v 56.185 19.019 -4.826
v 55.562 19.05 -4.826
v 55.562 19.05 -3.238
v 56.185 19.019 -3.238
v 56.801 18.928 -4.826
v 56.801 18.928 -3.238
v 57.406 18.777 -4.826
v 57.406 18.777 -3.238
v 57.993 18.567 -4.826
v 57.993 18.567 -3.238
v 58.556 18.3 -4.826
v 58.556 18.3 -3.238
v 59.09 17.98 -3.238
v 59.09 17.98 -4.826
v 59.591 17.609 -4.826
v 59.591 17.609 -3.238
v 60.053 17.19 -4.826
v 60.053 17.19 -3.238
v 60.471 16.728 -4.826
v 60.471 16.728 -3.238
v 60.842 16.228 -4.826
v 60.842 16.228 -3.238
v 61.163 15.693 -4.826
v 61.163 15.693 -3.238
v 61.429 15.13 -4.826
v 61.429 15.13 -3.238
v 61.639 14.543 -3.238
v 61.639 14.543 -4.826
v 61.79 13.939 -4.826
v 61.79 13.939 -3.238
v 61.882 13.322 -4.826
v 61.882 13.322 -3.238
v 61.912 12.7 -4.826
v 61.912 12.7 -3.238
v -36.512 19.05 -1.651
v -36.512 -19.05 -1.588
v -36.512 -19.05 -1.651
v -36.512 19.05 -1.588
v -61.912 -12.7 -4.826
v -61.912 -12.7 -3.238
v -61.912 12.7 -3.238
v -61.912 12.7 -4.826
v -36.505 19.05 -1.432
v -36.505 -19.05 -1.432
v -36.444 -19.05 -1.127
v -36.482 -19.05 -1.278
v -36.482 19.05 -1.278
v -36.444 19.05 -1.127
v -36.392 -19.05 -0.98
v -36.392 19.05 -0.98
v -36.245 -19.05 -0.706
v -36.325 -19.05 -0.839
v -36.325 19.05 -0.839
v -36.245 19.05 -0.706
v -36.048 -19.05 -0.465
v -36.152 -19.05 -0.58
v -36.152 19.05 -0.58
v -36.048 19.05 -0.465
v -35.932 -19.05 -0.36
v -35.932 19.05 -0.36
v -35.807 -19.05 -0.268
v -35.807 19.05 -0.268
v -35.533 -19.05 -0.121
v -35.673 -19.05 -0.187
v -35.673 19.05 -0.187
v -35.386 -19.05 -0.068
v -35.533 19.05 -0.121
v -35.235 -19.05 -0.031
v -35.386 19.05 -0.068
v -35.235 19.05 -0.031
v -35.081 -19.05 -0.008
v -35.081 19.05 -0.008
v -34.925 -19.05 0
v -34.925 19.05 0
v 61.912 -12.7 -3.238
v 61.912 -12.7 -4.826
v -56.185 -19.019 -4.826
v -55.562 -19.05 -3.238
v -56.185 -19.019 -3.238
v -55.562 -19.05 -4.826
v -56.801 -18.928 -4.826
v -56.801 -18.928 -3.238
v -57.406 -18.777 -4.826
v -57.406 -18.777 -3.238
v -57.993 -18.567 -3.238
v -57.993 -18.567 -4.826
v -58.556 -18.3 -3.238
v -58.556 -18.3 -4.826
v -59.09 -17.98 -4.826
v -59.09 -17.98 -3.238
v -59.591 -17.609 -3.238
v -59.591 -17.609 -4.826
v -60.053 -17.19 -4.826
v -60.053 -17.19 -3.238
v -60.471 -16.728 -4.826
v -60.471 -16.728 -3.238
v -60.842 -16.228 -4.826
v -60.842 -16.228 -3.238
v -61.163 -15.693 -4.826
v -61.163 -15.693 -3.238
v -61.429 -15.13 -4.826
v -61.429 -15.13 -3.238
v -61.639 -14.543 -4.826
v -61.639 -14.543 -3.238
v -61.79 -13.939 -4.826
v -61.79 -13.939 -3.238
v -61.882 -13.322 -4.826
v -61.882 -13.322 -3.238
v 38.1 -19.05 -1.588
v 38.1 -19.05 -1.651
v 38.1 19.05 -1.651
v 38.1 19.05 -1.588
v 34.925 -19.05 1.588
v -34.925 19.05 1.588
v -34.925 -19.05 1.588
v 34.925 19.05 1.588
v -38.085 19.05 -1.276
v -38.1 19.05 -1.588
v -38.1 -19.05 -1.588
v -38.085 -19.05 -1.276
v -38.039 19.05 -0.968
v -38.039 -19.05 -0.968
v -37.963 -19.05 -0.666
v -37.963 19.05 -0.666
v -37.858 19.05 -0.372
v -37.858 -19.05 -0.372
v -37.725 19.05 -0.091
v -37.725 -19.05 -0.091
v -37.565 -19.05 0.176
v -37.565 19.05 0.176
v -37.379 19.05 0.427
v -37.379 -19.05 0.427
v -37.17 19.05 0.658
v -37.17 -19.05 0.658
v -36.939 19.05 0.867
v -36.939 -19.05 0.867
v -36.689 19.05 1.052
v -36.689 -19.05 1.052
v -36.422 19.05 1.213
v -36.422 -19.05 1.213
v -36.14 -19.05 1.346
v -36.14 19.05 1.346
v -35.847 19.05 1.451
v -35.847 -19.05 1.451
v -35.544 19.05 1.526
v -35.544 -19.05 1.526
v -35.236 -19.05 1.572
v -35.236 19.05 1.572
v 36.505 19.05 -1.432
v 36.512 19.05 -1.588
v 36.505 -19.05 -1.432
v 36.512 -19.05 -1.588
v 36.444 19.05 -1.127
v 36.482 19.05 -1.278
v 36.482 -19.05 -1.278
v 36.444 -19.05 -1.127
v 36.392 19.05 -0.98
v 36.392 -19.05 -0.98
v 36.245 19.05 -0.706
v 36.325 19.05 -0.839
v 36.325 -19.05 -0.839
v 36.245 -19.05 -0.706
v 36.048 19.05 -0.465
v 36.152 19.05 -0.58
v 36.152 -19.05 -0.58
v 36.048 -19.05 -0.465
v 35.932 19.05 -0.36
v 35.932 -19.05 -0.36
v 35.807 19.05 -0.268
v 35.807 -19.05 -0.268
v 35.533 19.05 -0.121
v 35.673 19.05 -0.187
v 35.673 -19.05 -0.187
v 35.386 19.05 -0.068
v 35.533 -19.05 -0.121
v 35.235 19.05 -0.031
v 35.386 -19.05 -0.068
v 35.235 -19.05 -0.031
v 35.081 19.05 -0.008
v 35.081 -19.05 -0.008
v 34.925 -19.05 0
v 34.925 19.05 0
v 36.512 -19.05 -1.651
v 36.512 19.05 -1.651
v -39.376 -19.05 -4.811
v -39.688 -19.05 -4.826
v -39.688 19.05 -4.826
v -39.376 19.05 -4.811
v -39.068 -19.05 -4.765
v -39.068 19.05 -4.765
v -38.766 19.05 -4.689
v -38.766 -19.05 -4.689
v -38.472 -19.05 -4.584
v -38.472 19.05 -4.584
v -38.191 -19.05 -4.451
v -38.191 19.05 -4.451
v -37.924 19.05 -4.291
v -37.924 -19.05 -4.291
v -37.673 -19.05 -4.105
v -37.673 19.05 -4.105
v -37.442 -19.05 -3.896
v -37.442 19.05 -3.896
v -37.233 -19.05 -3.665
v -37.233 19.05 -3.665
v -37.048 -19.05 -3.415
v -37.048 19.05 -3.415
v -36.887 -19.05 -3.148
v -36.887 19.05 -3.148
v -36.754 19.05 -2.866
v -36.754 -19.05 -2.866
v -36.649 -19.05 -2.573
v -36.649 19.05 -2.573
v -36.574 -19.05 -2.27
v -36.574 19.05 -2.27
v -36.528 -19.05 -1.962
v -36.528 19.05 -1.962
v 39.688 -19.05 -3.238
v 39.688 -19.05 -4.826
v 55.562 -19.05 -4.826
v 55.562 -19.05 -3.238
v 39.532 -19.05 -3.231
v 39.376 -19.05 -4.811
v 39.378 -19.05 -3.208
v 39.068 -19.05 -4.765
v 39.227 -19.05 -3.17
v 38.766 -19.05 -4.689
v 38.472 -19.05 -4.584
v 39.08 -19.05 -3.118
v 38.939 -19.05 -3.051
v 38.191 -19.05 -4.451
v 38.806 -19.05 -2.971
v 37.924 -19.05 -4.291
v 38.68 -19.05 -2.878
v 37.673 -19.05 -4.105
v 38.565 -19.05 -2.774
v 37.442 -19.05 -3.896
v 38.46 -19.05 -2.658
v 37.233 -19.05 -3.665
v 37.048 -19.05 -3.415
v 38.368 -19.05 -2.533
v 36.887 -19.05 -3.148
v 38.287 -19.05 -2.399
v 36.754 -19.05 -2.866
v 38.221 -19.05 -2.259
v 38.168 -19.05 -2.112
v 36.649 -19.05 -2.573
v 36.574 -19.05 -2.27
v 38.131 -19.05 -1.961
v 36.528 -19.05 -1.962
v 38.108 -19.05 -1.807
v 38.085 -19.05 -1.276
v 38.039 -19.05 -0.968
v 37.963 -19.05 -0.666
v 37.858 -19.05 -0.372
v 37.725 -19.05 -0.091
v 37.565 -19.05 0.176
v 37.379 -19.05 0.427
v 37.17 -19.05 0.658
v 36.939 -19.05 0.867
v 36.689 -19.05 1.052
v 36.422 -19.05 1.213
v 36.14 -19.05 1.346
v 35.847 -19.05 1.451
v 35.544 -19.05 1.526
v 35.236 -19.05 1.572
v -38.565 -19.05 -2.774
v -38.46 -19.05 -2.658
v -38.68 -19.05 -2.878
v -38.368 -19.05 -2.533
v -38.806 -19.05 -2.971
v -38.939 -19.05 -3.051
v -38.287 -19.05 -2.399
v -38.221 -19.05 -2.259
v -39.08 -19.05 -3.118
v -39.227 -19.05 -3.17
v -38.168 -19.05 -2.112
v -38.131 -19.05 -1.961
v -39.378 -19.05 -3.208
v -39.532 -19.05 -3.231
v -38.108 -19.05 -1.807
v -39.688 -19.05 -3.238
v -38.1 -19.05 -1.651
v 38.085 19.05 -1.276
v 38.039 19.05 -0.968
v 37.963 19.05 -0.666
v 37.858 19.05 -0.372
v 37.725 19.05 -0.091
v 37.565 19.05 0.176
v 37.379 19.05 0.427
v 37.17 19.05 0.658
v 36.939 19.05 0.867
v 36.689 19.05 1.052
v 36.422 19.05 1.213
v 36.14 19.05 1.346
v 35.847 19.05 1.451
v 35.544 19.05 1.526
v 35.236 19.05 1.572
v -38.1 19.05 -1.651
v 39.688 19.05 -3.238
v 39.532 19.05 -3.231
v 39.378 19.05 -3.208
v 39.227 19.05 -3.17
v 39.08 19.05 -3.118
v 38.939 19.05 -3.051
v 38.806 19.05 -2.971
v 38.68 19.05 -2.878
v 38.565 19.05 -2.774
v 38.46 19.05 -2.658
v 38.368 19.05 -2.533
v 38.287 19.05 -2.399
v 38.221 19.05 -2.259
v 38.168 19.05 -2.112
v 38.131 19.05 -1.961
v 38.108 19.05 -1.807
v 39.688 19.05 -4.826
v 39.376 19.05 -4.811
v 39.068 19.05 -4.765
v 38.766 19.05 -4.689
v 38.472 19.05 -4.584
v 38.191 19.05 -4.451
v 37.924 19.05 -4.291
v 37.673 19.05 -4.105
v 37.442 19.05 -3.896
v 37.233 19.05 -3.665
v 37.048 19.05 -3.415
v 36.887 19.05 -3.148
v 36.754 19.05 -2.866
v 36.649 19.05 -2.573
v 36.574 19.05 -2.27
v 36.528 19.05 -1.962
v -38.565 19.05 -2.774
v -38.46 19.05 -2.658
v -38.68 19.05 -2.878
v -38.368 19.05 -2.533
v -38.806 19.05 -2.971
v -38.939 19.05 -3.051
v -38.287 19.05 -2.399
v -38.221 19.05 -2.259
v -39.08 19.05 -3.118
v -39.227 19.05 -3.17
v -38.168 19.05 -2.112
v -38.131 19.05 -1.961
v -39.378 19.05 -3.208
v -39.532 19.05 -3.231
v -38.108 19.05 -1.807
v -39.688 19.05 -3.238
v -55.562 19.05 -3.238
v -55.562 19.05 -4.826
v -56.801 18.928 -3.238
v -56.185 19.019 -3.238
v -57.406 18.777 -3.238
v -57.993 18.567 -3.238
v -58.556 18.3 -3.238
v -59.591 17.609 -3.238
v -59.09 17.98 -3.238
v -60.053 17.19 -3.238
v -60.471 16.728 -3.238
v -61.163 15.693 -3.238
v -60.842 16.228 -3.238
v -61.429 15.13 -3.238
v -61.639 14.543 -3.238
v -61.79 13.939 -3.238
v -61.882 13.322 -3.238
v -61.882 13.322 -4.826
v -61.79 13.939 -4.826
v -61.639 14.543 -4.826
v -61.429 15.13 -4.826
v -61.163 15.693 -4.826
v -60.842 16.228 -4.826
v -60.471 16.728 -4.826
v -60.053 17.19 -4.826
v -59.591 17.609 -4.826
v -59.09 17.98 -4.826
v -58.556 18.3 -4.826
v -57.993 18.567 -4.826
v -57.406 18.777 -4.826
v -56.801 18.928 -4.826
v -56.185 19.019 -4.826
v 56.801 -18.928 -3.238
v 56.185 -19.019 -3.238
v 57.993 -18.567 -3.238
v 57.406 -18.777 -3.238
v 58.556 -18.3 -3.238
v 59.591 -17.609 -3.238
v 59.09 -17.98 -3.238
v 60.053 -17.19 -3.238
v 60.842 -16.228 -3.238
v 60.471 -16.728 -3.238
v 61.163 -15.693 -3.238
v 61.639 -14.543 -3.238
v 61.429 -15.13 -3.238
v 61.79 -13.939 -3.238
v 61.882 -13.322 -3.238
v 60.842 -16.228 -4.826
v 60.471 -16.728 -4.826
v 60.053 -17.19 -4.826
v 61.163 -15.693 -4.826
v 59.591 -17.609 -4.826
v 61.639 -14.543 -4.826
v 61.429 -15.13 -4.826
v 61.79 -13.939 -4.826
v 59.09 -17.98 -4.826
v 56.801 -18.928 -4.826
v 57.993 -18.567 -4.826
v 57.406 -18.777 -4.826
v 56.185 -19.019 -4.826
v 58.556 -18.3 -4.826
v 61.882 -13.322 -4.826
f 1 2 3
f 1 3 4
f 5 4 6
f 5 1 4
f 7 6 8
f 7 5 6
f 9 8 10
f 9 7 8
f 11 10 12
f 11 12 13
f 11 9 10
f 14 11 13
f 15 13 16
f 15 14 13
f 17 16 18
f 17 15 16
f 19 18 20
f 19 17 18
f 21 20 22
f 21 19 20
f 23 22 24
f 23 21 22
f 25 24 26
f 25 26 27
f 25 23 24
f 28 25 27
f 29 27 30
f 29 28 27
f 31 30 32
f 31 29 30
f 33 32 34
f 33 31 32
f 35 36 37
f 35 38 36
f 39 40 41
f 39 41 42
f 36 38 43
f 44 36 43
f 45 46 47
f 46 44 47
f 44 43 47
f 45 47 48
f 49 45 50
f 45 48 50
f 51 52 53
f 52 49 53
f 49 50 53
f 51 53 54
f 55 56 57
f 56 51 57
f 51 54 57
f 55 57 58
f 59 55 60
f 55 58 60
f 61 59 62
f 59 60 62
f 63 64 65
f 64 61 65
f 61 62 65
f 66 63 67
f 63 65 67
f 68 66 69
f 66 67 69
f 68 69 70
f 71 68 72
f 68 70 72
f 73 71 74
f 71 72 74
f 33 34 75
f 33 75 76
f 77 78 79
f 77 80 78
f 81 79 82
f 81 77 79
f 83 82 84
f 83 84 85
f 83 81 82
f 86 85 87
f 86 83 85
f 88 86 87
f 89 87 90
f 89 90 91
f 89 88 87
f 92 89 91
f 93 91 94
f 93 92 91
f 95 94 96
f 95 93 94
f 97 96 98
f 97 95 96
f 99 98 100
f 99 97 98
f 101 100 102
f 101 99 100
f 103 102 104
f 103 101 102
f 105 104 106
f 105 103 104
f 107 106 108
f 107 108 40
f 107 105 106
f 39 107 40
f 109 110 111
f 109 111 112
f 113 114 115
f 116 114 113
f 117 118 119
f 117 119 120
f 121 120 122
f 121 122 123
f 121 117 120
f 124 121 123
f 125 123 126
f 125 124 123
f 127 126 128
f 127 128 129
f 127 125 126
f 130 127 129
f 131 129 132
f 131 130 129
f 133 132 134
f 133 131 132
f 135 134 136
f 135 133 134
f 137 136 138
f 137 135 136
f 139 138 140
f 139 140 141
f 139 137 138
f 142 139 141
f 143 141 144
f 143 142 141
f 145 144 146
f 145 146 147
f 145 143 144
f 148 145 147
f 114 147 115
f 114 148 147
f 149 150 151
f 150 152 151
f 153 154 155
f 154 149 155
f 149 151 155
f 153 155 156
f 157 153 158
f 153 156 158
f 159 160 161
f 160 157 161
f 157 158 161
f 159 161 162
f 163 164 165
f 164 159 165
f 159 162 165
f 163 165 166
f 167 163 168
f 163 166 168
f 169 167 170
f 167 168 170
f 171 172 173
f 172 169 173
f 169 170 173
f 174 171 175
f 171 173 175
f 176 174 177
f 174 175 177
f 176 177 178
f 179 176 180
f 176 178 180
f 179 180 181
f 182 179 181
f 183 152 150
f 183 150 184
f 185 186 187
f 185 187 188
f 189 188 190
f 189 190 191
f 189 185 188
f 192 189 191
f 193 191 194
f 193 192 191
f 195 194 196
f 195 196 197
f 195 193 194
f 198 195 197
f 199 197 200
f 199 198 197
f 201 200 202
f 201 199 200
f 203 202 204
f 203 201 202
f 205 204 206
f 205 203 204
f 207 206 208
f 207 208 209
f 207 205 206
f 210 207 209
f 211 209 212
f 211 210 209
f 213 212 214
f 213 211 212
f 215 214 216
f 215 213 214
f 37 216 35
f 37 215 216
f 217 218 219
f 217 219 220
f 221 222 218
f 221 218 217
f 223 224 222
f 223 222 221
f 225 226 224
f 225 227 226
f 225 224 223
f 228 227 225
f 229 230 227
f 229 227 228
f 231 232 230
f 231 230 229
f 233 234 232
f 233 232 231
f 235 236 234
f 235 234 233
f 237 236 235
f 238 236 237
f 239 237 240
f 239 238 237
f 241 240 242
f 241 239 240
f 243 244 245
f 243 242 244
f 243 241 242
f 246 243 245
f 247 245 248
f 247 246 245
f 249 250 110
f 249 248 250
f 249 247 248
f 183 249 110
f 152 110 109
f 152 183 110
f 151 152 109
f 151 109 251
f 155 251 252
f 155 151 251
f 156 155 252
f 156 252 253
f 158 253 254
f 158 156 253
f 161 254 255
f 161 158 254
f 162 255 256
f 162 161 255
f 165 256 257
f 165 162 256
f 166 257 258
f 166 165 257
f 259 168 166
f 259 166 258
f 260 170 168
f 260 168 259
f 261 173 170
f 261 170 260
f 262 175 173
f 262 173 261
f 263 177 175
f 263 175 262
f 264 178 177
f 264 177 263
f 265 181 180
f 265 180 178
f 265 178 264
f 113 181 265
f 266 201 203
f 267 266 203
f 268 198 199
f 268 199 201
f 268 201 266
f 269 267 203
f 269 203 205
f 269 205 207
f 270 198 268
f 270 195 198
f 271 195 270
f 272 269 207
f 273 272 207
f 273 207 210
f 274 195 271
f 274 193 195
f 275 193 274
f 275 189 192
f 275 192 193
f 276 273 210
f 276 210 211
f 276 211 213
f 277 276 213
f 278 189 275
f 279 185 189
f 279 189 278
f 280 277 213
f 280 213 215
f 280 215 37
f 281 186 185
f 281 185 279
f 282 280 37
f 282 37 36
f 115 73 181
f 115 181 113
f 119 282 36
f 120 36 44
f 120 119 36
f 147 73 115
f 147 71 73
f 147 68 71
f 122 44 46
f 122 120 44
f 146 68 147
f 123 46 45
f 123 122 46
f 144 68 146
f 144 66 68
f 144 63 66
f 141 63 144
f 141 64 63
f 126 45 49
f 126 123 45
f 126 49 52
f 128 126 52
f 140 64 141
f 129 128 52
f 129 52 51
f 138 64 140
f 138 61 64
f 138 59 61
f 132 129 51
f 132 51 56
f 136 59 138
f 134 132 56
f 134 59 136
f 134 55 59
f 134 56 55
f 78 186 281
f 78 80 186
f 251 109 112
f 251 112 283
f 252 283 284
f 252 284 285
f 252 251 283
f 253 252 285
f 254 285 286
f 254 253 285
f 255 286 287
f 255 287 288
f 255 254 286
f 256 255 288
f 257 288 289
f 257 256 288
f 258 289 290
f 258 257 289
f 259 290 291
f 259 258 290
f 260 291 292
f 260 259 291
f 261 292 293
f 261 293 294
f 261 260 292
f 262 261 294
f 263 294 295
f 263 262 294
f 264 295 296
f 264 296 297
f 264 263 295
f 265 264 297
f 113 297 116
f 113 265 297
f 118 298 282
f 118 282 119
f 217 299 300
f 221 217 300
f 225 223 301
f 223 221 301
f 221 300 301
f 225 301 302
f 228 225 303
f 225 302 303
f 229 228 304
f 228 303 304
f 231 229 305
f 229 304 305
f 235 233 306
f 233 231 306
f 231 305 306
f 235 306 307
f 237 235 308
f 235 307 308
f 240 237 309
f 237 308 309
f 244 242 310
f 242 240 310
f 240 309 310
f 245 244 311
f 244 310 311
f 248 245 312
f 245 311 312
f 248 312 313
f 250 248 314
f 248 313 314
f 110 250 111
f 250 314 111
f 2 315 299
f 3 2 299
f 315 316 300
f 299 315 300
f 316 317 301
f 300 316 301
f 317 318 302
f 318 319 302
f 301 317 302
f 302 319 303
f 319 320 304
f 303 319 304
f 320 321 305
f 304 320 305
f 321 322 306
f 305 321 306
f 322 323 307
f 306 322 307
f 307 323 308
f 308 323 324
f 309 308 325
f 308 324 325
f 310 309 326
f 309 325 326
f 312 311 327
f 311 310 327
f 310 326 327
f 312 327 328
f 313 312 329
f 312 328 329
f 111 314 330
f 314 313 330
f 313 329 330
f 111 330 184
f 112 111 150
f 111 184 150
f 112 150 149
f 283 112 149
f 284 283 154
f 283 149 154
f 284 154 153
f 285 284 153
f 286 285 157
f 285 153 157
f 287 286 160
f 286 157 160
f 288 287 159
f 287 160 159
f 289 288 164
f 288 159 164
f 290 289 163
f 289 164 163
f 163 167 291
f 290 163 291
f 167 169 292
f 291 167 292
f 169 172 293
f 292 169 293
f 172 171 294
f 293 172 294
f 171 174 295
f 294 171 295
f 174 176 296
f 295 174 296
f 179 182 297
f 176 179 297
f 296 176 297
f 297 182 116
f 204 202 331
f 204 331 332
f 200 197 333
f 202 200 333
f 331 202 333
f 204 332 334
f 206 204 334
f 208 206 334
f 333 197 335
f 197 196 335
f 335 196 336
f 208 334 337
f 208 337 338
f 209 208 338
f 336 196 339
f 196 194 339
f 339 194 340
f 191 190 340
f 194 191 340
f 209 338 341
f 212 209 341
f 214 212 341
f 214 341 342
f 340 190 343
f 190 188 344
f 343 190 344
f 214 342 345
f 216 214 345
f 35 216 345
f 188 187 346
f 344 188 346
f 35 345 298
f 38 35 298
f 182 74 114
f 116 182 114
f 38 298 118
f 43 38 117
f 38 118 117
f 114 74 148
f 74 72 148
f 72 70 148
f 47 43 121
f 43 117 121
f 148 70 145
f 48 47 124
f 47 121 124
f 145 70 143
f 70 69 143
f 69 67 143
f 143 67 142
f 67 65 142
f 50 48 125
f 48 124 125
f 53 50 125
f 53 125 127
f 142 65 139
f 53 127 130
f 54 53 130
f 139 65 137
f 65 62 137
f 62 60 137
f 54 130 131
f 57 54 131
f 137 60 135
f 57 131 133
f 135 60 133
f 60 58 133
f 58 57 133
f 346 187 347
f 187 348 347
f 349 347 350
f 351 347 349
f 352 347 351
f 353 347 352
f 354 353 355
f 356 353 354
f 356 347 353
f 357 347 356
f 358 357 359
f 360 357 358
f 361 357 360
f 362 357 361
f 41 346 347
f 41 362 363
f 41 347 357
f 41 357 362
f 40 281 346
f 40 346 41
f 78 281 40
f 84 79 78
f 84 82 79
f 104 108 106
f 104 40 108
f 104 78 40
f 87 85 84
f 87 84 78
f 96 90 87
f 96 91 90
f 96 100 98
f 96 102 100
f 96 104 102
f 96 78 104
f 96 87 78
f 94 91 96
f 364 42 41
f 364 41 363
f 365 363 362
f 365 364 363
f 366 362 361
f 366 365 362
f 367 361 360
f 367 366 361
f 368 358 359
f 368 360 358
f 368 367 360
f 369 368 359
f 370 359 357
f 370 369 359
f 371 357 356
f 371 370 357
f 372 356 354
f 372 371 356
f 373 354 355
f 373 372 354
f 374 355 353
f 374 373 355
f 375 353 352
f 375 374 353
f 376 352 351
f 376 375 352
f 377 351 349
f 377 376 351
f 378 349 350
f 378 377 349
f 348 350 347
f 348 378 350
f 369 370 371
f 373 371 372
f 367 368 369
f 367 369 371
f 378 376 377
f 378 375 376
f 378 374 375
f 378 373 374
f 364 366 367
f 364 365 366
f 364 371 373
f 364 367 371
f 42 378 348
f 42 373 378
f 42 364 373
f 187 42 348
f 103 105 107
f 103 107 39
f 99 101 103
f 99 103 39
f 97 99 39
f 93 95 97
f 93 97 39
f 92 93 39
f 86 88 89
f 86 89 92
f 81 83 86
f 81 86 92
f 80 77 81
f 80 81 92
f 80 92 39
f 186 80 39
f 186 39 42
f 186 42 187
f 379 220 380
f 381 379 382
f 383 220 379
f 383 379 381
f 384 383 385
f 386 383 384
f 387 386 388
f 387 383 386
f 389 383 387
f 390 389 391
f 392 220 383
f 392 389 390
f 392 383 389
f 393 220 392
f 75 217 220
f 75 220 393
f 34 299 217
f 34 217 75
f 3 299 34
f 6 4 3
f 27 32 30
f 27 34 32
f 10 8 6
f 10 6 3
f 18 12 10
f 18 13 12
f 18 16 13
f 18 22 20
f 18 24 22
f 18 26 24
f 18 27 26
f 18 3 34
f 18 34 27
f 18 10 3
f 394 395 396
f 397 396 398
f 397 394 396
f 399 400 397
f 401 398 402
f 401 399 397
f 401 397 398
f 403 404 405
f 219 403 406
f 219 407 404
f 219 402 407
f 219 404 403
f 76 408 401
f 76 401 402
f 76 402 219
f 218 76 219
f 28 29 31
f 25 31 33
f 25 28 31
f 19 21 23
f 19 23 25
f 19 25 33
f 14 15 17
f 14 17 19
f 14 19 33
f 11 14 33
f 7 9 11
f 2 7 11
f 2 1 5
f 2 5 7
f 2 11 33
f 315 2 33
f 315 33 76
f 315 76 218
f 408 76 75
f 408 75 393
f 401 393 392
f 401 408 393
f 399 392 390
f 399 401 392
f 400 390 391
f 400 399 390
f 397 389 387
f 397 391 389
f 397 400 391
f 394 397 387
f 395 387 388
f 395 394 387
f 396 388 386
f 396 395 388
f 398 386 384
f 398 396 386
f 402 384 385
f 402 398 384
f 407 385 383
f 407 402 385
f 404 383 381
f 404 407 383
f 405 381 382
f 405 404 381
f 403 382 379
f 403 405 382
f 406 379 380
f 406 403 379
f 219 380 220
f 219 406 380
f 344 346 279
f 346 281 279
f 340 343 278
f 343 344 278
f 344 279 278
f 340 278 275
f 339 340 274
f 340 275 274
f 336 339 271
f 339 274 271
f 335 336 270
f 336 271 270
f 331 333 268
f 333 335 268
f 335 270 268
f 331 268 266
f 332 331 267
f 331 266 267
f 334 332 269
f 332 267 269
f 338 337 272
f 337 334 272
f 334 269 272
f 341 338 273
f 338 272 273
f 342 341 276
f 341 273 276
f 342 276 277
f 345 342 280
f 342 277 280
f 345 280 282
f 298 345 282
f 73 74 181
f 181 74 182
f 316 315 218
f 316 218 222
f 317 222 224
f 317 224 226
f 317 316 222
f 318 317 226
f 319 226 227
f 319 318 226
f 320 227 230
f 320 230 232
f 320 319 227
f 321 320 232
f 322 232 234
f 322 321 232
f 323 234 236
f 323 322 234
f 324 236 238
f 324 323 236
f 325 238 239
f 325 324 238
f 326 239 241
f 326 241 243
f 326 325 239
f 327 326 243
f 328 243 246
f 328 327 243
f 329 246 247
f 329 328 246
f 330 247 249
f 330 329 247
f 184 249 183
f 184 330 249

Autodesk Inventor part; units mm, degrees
ref_plane "YZ Plane" through (0, 0, 0) normal (1, 0, 0) x (0, 1, 0)
ref_plane "XZ Plane" through (0, 0, 0) normal (0, 1, 0) x (-1, 0, 0)
ref_plane "XY Plane" through (0, 0, 0) normal (0, 0, 1) x (1, 0, 0)
sketch "Sketch1" plane through (0, 0, 0) normal (0, 0, 1) x (1, 0, 0)
  line L0 (-38.1, -19.05) -> (38.1, -19.05)
  line L1 (38.1, -19.05) -> (38.1, 19.05)
  line L2 (38.1, 19.05) -> (-38.1, 19.05)
  line L3 (-38.1, 19.05) -> (-38.1, -19.05)
  line L4 (-38.1, -19.05) -> (38.1, 19.05) construction
  line L5 (38.1, -19.05) -> (-38.1, 19.05) construction
  point P0 (0, 0)
  dimension "d0" = 76.2
  dimension "d1" = 38.1
extrude "Plate1" add sketch "Sketch1" along normal blind 1.5875
sketch "Sketch2" plane through (36.5125, -19.05, 1.5875) normal (1, 0, 0) x (0, 1, 0)
  line L0 (38.1, 0) -> (0, 0)
  line L1 (0, 0) -> (0, -4.826)
  line L2 (0, -4.826) -> (38.1, -4.826)
  line L3 (38.1, -4.826) -> (38.1, 0)
edge flange "Flange1" height 4.826 angle 90 thickness 1.5875 bend radius 1.5875 thickness toward (1, 0, 0) relief tear relief width 1.5875 relief depth 0.7937 corner gap 1.5875 corner form 0 edges at (38.1, 0, 0) (-38.1, 0, 0) wall of the first edge with corners at (36.5125, 19.05, 1.5875) (36.5125, -19.05, 1.5875) (36.5125, -19.05, -3.2385) (36.5125, 19.05, -3.2385)
bend "Bend1"
corner "Corner1"
sketch "Sketch3" plane through (-38.1, -19.05, -3.2385) normal (0, 0, -1) x (-1, 0, 0)
  line L0 (0, 38.1) -> (0, 0)
  line L1 (0, 0) -> (23.8125, 0)
  line L2 (23.8125, 0) -> (23.8125, 38.1)
  line L3 (23.8125, 38.1) -> (0, 38.1)
edge flange "Flange2" height 25.4 angle 90 thickness 1.5875 bend radius 1.5875 thickness toward (0, 0, -1) relief tear relief width 1.5875 relief depth 0.7937 corner gap 1.5875 corner form 0 edges at (-38.1, 0, -3.2385) (38.1, 0, -3.2385) wall of the first edge with corners at (-38.1, 19.05, -3.2385) (-38.1, -19.05, -3.2385) (-61.9125, -19.05, -3.2385) (-61.9125, 19.05, -3.2385)
bend "Bend2"
corner "Corner2"
fillet "Fillet1" radius 6.35 4 edges at (-61.9125, 19.05, -4.0323) (-61.9125, -19.05, -4.0323) (61.9125, -19.05, -4.0323) (61.9125, 19.05, -4.0323)
equation "\"d3\" = BendReliefWidth"
equation "\"d4\" = BendReliefDepth"
equation "\"d5\" = MinimumRemnant"
equation "\"d6\" = BendRadius"
equation "\"d9\" = BendRadius"
equation "\"d10\" = CornerReliefSize"
equation "\"d11\" = GapSize"
equation "\"d12\" = JacobiRadiusSize"
equation "\"d13\" = BendReliefWidth"
equation "\"d14\" = BendReliefDepth"
equation "\"d15\" = MinimumRemnant"
equation "\"d16\" = BendRadius"
equation "\"d19\" = BendRadius"
equation "\"d20\" = CornerReliefSize"
equation "\"d21\" = GapSize"
equation "\"d22\" = JacobiRadiusSize"
equation "\"BendRadius\" = Thickness"
equation "\"BendReliefWidth\" = Thickness"
equation "\"BendReliefDepth\" = 0.5 * Thickness"
equation "\"CornerReliefSize\" = 4 * Thickness"
equation "\"MinimumRemnant\" = 2 * Thickness"
equation "\"TransitionRadius\" = BendRadius"
equation "\"JacobiRadiusSize\" = BendRadius"
equation "\"GapSize\" = Thickness"
equation "\"d2\" = BendRadius"
equation "\"Thickness\" = 1.5875"
properties part number "Center Rail Bracket" material "Steel, Galvanized"
